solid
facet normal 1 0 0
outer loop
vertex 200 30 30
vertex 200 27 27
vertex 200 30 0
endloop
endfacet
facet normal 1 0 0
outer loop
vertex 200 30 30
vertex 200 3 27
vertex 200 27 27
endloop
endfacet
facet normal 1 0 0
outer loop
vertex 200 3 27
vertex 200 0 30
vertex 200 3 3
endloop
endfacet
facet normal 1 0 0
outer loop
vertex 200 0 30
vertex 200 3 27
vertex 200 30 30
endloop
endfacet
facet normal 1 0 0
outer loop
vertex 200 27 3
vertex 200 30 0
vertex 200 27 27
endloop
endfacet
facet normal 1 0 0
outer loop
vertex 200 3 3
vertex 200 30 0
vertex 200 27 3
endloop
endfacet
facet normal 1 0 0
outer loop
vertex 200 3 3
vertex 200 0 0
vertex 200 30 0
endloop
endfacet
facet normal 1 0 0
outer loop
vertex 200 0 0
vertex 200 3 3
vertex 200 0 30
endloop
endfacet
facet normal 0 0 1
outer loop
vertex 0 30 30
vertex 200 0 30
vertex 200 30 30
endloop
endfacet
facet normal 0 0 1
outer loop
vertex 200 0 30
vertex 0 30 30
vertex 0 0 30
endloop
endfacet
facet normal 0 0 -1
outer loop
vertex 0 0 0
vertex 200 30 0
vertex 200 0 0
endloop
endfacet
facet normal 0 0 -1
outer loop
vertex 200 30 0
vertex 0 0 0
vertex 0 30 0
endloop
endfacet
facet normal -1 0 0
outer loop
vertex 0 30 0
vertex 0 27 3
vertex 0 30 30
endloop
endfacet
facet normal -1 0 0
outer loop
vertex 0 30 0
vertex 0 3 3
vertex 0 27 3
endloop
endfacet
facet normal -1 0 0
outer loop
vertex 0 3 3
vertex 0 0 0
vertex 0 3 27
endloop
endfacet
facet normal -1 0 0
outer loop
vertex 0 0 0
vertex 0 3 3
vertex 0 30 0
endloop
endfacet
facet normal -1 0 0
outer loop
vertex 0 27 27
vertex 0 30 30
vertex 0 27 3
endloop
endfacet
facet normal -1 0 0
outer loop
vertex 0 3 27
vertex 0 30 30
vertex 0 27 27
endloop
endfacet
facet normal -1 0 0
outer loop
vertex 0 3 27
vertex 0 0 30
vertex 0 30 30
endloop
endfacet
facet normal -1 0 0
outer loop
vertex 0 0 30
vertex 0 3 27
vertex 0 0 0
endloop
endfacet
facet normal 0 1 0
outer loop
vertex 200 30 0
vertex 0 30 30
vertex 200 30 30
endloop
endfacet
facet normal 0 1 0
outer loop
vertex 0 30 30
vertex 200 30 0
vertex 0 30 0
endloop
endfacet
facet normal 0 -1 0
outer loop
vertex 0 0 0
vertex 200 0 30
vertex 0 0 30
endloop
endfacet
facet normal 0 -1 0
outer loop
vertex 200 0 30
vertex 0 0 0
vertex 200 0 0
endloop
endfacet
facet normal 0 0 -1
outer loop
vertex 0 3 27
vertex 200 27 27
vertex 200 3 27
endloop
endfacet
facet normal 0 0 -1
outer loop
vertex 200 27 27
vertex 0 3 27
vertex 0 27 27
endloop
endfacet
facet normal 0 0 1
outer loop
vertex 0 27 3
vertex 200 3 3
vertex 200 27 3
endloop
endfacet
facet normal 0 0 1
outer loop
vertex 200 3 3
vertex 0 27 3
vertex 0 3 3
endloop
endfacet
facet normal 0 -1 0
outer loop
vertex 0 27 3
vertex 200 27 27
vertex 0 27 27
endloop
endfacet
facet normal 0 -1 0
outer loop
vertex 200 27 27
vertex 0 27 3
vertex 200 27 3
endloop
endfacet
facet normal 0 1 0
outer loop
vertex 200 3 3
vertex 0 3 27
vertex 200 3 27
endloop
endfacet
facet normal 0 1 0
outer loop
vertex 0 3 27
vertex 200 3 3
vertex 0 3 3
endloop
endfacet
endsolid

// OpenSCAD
$fn = 32;

// ----------------------------------------------------------------------
// Box beam: 200-250 mm hollow beam
// ----------------------------------------------------------------------

// --- parameters (mm) ---
beam_l = 200;             // beam length, X
beam_w = 30;              // beam width, Y
beam_h = 30;              // beam height, Z
wall = 3;                 // wall thickness

difference() {
  cube([beam_l, beam_w, beam_h]);
  translate([-1, wall, wall])
    cube([beam_l + 2, beam_w - 2 * wall, beam_h - 2 * wall]);
}
